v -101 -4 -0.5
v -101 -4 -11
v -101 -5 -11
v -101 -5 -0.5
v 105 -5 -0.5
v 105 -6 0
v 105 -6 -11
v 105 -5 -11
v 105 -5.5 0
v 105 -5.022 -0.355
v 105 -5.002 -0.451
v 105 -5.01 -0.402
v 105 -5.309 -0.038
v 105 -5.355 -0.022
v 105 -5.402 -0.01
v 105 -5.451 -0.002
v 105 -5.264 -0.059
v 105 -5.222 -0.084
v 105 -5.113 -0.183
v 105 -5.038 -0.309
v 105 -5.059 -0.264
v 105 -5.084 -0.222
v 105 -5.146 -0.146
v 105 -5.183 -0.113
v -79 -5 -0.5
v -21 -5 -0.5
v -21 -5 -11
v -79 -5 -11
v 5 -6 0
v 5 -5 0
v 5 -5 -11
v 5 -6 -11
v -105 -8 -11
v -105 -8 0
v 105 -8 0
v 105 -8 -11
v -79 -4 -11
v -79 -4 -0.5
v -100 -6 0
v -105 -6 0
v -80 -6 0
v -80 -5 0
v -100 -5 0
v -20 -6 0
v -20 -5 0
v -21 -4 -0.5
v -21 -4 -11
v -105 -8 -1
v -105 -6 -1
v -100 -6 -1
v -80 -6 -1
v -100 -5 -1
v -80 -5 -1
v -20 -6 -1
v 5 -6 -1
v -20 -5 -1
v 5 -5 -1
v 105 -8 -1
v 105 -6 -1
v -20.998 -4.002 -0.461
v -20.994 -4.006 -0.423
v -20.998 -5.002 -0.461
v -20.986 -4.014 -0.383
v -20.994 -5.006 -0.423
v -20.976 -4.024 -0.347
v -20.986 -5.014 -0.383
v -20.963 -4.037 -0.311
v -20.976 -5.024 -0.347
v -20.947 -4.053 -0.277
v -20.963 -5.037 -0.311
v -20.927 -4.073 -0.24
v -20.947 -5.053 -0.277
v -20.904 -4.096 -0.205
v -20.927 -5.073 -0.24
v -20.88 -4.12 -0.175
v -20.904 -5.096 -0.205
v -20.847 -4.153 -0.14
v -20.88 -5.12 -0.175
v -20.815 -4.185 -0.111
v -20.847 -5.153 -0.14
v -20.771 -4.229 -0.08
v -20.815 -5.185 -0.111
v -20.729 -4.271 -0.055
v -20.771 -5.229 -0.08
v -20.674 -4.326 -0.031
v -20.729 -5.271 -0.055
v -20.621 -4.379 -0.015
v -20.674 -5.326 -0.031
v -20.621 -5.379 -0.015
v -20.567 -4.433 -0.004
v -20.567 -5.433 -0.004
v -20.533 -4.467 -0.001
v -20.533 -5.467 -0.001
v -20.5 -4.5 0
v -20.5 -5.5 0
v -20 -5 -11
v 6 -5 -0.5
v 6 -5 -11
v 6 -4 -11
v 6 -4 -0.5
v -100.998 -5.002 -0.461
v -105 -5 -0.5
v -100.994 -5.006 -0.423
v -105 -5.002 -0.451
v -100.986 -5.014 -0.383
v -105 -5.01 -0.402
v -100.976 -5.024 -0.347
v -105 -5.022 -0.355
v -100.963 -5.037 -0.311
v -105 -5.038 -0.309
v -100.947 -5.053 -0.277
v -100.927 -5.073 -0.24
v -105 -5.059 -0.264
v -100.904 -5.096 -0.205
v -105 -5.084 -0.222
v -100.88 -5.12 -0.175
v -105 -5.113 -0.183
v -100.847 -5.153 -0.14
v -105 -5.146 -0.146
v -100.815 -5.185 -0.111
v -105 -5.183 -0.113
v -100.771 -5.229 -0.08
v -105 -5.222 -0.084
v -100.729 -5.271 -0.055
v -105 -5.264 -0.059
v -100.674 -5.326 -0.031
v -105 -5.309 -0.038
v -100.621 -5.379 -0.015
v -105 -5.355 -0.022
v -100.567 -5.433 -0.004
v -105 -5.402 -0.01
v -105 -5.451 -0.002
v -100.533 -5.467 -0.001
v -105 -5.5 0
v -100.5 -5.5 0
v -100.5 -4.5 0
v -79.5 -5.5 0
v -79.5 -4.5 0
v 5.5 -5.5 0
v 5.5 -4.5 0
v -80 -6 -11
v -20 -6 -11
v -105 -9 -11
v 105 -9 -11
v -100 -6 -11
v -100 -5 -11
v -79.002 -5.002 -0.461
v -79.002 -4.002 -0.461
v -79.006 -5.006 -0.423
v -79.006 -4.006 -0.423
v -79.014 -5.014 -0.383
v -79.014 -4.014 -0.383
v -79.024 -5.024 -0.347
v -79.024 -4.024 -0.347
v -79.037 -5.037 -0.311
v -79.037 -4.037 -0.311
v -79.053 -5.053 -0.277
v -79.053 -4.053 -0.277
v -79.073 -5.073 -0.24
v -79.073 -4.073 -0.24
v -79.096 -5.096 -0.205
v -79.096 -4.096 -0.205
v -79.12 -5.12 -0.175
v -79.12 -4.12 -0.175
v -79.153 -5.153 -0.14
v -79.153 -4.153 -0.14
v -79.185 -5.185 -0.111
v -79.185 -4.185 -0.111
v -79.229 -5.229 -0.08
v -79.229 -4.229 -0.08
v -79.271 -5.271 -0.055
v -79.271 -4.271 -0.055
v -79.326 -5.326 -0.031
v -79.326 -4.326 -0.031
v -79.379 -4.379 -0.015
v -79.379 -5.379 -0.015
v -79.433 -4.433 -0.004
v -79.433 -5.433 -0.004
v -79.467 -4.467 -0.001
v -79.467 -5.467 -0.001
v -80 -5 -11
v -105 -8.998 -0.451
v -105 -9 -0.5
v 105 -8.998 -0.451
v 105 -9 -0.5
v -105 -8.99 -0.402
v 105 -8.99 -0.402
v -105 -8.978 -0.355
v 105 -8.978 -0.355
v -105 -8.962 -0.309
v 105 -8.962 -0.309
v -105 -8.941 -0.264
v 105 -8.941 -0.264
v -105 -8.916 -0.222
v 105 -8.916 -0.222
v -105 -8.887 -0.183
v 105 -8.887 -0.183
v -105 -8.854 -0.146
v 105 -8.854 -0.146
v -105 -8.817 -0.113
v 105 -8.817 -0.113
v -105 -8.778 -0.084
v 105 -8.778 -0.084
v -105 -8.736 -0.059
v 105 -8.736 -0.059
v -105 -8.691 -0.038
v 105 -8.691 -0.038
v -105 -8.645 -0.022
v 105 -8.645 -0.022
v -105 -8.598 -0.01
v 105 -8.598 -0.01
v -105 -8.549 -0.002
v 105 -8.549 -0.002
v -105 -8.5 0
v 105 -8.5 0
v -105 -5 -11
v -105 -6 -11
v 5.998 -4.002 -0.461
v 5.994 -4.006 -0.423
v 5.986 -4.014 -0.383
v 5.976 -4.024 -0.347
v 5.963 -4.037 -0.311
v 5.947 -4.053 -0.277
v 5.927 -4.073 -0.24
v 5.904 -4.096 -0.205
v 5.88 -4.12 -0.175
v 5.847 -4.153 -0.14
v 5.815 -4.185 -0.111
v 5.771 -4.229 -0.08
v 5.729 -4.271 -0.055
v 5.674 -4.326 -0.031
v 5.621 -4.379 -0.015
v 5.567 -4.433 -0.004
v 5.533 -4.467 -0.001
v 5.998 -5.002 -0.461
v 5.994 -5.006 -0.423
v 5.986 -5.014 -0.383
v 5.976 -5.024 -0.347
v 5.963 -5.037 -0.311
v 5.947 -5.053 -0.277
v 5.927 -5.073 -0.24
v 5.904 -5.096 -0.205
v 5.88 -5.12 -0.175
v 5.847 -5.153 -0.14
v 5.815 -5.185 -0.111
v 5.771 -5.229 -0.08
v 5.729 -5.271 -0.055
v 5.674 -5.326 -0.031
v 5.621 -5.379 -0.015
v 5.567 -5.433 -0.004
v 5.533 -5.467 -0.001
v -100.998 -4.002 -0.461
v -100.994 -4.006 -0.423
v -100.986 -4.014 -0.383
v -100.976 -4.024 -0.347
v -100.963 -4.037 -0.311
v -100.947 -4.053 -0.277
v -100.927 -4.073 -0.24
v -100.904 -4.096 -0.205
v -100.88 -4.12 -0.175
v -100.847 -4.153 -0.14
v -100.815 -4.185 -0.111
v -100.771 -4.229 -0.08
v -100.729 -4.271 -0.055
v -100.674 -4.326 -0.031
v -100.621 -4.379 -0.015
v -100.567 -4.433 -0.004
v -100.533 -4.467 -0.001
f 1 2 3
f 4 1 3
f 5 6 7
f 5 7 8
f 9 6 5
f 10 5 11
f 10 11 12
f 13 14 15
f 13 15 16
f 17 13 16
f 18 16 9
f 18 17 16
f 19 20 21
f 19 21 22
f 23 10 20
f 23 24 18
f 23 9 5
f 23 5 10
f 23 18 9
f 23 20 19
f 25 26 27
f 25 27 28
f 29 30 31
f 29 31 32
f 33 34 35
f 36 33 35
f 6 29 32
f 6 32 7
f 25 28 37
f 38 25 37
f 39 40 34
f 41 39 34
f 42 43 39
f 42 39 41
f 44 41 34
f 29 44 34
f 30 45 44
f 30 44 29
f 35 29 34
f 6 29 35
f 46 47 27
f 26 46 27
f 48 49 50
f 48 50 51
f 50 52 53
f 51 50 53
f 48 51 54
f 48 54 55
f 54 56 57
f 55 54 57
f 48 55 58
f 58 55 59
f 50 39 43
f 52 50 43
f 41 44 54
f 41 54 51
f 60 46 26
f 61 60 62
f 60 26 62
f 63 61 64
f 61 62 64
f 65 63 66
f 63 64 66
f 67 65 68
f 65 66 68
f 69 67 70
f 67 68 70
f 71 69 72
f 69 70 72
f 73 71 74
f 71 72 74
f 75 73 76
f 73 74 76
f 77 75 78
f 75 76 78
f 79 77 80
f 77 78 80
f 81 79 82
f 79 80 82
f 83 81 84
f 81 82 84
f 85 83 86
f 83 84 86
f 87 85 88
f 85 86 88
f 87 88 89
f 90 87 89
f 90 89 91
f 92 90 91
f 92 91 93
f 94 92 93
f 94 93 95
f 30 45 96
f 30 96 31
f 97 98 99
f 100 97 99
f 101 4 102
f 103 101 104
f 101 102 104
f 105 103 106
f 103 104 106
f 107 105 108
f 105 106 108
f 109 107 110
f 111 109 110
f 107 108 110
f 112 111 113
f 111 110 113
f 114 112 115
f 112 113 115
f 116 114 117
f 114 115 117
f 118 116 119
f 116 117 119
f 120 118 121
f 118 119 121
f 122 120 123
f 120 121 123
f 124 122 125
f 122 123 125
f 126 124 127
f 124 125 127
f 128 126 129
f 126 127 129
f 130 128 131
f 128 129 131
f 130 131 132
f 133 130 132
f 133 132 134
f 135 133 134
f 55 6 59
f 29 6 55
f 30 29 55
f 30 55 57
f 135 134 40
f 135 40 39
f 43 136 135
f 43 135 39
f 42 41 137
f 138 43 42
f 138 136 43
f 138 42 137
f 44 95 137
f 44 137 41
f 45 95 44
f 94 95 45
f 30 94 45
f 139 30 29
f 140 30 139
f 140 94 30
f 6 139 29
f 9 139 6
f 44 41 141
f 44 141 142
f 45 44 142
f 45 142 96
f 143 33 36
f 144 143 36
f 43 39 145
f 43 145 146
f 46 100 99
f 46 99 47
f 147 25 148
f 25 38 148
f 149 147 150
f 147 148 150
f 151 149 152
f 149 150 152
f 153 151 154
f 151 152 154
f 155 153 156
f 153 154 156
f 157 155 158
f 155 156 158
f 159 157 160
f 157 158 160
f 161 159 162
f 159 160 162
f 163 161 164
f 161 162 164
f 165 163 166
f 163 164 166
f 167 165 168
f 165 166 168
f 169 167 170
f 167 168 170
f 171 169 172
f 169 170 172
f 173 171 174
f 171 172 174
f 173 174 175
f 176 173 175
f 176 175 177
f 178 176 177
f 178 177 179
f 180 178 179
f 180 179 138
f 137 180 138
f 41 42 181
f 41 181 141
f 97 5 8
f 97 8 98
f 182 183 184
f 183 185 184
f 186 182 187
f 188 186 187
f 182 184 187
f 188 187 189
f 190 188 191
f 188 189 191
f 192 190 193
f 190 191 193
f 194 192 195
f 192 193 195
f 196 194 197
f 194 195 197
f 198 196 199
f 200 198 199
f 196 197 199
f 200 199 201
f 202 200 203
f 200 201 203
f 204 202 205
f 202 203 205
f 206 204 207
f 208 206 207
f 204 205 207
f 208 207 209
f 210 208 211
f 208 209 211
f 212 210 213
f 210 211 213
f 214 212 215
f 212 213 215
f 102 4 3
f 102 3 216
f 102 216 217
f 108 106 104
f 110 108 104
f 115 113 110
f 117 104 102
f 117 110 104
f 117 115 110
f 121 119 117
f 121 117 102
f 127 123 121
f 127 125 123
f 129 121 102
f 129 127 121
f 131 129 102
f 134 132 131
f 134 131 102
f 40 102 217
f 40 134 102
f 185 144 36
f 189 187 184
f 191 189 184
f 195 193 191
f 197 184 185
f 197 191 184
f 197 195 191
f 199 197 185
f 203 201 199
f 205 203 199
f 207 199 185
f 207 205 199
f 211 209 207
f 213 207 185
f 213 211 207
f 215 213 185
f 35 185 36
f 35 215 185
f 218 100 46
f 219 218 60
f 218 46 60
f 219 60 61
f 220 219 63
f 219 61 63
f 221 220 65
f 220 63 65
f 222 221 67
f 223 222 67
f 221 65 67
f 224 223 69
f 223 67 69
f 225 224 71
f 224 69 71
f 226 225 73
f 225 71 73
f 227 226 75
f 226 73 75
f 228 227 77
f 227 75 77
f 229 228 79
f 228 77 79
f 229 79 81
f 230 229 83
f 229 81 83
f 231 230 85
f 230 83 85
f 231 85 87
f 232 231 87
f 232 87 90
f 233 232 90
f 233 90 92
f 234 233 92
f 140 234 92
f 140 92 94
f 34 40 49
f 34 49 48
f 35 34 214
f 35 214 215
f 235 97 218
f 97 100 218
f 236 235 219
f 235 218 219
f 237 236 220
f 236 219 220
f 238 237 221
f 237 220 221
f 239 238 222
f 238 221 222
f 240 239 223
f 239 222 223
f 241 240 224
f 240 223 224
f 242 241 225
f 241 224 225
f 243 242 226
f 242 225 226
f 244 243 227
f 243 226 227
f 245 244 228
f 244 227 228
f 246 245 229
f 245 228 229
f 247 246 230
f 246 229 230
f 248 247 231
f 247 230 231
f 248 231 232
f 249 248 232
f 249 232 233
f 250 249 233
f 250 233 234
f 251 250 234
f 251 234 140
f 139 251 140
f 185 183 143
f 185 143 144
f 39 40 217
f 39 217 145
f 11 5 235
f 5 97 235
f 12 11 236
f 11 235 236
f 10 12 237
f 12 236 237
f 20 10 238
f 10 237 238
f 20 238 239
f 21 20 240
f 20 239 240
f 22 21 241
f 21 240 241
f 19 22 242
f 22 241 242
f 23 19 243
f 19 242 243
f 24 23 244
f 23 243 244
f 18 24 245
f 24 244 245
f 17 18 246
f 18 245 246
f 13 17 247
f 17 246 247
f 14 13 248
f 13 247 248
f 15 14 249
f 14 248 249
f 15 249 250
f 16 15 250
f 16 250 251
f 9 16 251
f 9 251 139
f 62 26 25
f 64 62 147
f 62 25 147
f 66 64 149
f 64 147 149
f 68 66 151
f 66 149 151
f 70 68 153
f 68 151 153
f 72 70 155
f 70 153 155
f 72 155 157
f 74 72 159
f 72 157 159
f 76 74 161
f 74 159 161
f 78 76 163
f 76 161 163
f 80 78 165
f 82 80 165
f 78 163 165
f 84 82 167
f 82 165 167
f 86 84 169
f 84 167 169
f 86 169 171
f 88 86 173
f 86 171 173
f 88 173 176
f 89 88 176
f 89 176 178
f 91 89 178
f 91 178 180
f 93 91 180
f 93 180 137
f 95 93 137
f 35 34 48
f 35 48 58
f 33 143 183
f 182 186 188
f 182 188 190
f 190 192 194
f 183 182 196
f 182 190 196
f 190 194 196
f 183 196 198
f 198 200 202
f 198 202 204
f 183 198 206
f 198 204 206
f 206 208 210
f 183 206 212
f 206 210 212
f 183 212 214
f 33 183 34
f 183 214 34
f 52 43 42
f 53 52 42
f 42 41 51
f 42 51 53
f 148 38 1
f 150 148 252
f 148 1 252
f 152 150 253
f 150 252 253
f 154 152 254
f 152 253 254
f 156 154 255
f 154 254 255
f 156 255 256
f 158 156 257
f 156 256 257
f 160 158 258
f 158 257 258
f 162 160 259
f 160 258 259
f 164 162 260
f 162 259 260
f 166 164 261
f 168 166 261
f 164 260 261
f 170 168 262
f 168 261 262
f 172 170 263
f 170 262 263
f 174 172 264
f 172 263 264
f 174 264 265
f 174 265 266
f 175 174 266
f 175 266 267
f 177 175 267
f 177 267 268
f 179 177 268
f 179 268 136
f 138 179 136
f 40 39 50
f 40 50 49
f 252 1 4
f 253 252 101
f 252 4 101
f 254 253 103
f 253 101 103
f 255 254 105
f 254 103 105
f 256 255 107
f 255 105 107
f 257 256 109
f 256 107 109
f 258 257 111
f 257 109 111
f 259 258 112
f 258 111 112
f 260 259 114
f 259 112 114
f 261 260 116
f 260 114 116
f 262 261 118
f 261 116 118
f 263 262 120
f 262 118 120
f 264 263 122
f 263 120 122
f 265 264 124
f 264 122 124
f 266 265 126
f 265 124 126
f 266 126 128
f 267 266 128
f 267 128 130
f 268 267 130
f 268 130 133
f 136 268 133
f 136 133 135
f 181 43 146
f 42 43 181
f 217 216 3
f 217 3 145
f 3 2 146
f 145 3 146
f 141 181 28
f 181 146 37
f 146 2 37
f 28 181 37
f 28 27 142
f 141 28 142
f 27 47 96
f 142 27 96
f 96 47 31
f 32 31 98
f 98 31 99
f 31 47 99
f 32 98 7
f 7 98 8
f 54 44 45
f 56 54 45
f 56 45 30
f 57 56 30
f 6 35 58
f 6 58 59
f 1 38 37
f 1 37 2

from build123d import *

# Parameters (mm, degrees)
F0_W     = 20
F0_H     = 1
F0_W_2   = 25
F1_DEPTH = 1
F2_DEPTH = 11
F0_W_3   = 210
F3_R     = 0.5
F3_2_R   = 0.5


with BuildPart() as f1:
    # F0 (on Top) → F1 (new body)
    with BuildSketch(Plane.XY):
        Polygon((-100, -6), (-105, -6), (-105, -8), (105, -8), (105, -6), (5, -6), (-20, -6), (-80, -6), align=None)
        with Locations((-90, -5.5)):
            Rectangle(F0_W, F0_H)
        with Locations((-7.5, -5.5)):
            Rectangle(F0_W_2, F0_H)
    extrude(amount=-F1_DEPTH)


with BuildPart() as f2:
    # F0 (on Top) → F2 (new body)
    with BuildSketch(Plane.XY):
        Polygon((-101, -4), (-101, -5), (-100, -5), (-80, -5), (-79, -5), (-79, -4), align=None)
        Polygon((-101, -5), (-105, -5), (-105, -6), (-100, -6), (-100, -5), align=None)
        Polygon((-79, -5), (-80, -5), (-80, -6), (-20, -6), (-20, -5), (-21, -5), align=None)
        Polygon((-21, -4), (-21, -5), (-20, -5), (5, -5), (6, -5), (6, -4), align=None)
        Polygon((5, -6), (105, -6), (105, -5), (6, -5), (5, -5), align=None)
    extrude(amount=-F2_DEPTH)

    # F3
    f3_edges = [f2.edges().sort_by_distance(p)[0] for p in [
        (-103, -5, 0),
        (-21, -4.5, 0),
        (-7.5, -4, 0),
        (6, -4.5, 0),
        (55.5, -5, 0),
        (-90, -4, 0),
        (-79, -4.5, 0),
        (-101, -4.5, 0),
        (-50, -5, 0),
    ]]
    fillet(f3_edges, radius=F3_R)


with BuildPart() as f2b:
    # F0 (on Top) → F2, piece 2 (new body)
    with BuildSketch(Plane.XY):
        with Locations((0, -8.5)):
            Rectangle(F0_W_3, F0_H)
    extrude(amount=-F2_DEPTH)

    # F3#2
    f3_2_edges = [f2b.edges().sort_by_distance(p)[0] for p in [
        (0, -9, 0),
    ]]
    fillet(f3_2_edges, radius=F3_2_R)


solid = Compound([f1.part, f2.part, f2b.part])
